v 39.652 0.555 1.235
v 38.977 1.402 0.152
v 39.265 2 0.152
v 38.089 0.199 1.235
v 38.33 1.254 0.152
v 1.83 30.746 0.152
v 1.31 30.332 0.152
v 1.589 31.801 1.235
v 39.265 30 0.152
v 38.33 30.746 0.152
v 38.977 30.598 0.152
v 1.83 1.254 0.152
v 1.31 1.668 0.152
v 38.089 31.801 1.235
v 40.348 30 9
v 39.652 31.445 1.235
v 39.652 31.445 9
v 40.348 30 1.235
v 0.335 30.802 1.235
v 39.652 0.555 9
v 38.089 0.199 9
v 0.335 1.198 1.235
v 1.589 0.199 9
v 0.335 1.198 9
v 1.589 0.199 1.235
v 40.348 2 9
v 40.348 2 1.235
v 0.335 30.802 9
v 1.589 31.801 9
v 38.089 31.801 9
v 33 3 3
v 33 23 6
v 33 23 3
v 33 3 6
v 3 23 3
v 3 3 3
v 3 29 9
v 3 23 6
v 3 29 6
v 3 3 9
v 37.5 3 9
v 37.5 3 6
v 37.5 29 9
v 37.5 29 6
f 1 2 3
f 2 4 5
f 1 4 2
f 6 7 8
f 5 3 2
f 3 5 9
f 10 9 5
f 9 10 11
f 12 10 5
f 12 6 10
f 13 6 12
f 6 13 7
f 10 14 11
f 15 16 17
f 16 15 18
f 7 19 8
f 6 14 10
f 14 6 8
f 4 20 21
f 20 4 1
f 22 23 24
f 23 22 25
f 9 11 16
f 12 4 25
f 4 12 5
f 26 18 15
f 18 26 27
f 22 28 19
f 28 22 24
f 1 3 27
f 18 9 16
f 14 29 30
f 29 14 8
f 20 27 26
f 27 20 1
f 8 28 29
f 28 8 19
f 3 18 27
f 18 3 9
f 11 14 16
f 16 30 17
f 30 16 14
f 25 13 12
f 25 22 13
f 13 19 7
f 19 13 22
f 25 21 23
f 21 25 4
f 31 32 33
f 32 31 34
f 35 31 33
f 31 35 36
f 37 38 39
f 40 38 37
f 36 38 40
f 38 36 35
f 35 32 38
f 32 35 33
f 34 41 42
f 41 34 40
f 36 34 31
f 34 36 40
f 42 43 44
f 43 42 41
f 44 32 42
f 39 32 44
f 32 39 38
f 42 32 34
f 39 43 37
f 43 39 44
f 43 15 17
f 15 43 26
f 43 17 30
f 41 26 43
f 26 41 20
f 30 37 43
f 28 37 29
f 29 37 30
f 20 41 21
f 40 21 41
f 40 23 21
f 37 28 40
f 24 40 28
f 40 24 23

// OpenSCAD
Bx=30;     //battery size
By=20;
Bz=3;

Cx=34.5;     //circuit size
Cy=26;
Cz=3;

b=3;    //border width
r=2;    //radius of curvature

x=Cx+(2*b);    //case size
y=Cy+(2*b);
z=Cz+Bz+b;

intersection() {
    difference() {
        translate([r,r,r]) hull() {
            sphere(r);
            translate([x-(2*r),0,0]) sphere(r);
            translate([0,y-(2*r),0]) sphere(r);
            translate([0,0,z-r]) sphere(r);
            translate([x-(2*r),y-(2*r),0]) sphere(r);
            translate([x-(2*r),0,z-r]) sphere(r);
            translate([0,y-(2*r),z-r]) sphere(r);
            translate([x-(2*r),y-(2*r),z-r]) sphere(r);
        }

        translate([b,b,b]) cube([Bx,By,Bz+0.1]);
        translate([b,b,b+Bz]) cube([Cx,Cy,Cz+0.1]);
    
    }
    cube([x,y,z]);
}
